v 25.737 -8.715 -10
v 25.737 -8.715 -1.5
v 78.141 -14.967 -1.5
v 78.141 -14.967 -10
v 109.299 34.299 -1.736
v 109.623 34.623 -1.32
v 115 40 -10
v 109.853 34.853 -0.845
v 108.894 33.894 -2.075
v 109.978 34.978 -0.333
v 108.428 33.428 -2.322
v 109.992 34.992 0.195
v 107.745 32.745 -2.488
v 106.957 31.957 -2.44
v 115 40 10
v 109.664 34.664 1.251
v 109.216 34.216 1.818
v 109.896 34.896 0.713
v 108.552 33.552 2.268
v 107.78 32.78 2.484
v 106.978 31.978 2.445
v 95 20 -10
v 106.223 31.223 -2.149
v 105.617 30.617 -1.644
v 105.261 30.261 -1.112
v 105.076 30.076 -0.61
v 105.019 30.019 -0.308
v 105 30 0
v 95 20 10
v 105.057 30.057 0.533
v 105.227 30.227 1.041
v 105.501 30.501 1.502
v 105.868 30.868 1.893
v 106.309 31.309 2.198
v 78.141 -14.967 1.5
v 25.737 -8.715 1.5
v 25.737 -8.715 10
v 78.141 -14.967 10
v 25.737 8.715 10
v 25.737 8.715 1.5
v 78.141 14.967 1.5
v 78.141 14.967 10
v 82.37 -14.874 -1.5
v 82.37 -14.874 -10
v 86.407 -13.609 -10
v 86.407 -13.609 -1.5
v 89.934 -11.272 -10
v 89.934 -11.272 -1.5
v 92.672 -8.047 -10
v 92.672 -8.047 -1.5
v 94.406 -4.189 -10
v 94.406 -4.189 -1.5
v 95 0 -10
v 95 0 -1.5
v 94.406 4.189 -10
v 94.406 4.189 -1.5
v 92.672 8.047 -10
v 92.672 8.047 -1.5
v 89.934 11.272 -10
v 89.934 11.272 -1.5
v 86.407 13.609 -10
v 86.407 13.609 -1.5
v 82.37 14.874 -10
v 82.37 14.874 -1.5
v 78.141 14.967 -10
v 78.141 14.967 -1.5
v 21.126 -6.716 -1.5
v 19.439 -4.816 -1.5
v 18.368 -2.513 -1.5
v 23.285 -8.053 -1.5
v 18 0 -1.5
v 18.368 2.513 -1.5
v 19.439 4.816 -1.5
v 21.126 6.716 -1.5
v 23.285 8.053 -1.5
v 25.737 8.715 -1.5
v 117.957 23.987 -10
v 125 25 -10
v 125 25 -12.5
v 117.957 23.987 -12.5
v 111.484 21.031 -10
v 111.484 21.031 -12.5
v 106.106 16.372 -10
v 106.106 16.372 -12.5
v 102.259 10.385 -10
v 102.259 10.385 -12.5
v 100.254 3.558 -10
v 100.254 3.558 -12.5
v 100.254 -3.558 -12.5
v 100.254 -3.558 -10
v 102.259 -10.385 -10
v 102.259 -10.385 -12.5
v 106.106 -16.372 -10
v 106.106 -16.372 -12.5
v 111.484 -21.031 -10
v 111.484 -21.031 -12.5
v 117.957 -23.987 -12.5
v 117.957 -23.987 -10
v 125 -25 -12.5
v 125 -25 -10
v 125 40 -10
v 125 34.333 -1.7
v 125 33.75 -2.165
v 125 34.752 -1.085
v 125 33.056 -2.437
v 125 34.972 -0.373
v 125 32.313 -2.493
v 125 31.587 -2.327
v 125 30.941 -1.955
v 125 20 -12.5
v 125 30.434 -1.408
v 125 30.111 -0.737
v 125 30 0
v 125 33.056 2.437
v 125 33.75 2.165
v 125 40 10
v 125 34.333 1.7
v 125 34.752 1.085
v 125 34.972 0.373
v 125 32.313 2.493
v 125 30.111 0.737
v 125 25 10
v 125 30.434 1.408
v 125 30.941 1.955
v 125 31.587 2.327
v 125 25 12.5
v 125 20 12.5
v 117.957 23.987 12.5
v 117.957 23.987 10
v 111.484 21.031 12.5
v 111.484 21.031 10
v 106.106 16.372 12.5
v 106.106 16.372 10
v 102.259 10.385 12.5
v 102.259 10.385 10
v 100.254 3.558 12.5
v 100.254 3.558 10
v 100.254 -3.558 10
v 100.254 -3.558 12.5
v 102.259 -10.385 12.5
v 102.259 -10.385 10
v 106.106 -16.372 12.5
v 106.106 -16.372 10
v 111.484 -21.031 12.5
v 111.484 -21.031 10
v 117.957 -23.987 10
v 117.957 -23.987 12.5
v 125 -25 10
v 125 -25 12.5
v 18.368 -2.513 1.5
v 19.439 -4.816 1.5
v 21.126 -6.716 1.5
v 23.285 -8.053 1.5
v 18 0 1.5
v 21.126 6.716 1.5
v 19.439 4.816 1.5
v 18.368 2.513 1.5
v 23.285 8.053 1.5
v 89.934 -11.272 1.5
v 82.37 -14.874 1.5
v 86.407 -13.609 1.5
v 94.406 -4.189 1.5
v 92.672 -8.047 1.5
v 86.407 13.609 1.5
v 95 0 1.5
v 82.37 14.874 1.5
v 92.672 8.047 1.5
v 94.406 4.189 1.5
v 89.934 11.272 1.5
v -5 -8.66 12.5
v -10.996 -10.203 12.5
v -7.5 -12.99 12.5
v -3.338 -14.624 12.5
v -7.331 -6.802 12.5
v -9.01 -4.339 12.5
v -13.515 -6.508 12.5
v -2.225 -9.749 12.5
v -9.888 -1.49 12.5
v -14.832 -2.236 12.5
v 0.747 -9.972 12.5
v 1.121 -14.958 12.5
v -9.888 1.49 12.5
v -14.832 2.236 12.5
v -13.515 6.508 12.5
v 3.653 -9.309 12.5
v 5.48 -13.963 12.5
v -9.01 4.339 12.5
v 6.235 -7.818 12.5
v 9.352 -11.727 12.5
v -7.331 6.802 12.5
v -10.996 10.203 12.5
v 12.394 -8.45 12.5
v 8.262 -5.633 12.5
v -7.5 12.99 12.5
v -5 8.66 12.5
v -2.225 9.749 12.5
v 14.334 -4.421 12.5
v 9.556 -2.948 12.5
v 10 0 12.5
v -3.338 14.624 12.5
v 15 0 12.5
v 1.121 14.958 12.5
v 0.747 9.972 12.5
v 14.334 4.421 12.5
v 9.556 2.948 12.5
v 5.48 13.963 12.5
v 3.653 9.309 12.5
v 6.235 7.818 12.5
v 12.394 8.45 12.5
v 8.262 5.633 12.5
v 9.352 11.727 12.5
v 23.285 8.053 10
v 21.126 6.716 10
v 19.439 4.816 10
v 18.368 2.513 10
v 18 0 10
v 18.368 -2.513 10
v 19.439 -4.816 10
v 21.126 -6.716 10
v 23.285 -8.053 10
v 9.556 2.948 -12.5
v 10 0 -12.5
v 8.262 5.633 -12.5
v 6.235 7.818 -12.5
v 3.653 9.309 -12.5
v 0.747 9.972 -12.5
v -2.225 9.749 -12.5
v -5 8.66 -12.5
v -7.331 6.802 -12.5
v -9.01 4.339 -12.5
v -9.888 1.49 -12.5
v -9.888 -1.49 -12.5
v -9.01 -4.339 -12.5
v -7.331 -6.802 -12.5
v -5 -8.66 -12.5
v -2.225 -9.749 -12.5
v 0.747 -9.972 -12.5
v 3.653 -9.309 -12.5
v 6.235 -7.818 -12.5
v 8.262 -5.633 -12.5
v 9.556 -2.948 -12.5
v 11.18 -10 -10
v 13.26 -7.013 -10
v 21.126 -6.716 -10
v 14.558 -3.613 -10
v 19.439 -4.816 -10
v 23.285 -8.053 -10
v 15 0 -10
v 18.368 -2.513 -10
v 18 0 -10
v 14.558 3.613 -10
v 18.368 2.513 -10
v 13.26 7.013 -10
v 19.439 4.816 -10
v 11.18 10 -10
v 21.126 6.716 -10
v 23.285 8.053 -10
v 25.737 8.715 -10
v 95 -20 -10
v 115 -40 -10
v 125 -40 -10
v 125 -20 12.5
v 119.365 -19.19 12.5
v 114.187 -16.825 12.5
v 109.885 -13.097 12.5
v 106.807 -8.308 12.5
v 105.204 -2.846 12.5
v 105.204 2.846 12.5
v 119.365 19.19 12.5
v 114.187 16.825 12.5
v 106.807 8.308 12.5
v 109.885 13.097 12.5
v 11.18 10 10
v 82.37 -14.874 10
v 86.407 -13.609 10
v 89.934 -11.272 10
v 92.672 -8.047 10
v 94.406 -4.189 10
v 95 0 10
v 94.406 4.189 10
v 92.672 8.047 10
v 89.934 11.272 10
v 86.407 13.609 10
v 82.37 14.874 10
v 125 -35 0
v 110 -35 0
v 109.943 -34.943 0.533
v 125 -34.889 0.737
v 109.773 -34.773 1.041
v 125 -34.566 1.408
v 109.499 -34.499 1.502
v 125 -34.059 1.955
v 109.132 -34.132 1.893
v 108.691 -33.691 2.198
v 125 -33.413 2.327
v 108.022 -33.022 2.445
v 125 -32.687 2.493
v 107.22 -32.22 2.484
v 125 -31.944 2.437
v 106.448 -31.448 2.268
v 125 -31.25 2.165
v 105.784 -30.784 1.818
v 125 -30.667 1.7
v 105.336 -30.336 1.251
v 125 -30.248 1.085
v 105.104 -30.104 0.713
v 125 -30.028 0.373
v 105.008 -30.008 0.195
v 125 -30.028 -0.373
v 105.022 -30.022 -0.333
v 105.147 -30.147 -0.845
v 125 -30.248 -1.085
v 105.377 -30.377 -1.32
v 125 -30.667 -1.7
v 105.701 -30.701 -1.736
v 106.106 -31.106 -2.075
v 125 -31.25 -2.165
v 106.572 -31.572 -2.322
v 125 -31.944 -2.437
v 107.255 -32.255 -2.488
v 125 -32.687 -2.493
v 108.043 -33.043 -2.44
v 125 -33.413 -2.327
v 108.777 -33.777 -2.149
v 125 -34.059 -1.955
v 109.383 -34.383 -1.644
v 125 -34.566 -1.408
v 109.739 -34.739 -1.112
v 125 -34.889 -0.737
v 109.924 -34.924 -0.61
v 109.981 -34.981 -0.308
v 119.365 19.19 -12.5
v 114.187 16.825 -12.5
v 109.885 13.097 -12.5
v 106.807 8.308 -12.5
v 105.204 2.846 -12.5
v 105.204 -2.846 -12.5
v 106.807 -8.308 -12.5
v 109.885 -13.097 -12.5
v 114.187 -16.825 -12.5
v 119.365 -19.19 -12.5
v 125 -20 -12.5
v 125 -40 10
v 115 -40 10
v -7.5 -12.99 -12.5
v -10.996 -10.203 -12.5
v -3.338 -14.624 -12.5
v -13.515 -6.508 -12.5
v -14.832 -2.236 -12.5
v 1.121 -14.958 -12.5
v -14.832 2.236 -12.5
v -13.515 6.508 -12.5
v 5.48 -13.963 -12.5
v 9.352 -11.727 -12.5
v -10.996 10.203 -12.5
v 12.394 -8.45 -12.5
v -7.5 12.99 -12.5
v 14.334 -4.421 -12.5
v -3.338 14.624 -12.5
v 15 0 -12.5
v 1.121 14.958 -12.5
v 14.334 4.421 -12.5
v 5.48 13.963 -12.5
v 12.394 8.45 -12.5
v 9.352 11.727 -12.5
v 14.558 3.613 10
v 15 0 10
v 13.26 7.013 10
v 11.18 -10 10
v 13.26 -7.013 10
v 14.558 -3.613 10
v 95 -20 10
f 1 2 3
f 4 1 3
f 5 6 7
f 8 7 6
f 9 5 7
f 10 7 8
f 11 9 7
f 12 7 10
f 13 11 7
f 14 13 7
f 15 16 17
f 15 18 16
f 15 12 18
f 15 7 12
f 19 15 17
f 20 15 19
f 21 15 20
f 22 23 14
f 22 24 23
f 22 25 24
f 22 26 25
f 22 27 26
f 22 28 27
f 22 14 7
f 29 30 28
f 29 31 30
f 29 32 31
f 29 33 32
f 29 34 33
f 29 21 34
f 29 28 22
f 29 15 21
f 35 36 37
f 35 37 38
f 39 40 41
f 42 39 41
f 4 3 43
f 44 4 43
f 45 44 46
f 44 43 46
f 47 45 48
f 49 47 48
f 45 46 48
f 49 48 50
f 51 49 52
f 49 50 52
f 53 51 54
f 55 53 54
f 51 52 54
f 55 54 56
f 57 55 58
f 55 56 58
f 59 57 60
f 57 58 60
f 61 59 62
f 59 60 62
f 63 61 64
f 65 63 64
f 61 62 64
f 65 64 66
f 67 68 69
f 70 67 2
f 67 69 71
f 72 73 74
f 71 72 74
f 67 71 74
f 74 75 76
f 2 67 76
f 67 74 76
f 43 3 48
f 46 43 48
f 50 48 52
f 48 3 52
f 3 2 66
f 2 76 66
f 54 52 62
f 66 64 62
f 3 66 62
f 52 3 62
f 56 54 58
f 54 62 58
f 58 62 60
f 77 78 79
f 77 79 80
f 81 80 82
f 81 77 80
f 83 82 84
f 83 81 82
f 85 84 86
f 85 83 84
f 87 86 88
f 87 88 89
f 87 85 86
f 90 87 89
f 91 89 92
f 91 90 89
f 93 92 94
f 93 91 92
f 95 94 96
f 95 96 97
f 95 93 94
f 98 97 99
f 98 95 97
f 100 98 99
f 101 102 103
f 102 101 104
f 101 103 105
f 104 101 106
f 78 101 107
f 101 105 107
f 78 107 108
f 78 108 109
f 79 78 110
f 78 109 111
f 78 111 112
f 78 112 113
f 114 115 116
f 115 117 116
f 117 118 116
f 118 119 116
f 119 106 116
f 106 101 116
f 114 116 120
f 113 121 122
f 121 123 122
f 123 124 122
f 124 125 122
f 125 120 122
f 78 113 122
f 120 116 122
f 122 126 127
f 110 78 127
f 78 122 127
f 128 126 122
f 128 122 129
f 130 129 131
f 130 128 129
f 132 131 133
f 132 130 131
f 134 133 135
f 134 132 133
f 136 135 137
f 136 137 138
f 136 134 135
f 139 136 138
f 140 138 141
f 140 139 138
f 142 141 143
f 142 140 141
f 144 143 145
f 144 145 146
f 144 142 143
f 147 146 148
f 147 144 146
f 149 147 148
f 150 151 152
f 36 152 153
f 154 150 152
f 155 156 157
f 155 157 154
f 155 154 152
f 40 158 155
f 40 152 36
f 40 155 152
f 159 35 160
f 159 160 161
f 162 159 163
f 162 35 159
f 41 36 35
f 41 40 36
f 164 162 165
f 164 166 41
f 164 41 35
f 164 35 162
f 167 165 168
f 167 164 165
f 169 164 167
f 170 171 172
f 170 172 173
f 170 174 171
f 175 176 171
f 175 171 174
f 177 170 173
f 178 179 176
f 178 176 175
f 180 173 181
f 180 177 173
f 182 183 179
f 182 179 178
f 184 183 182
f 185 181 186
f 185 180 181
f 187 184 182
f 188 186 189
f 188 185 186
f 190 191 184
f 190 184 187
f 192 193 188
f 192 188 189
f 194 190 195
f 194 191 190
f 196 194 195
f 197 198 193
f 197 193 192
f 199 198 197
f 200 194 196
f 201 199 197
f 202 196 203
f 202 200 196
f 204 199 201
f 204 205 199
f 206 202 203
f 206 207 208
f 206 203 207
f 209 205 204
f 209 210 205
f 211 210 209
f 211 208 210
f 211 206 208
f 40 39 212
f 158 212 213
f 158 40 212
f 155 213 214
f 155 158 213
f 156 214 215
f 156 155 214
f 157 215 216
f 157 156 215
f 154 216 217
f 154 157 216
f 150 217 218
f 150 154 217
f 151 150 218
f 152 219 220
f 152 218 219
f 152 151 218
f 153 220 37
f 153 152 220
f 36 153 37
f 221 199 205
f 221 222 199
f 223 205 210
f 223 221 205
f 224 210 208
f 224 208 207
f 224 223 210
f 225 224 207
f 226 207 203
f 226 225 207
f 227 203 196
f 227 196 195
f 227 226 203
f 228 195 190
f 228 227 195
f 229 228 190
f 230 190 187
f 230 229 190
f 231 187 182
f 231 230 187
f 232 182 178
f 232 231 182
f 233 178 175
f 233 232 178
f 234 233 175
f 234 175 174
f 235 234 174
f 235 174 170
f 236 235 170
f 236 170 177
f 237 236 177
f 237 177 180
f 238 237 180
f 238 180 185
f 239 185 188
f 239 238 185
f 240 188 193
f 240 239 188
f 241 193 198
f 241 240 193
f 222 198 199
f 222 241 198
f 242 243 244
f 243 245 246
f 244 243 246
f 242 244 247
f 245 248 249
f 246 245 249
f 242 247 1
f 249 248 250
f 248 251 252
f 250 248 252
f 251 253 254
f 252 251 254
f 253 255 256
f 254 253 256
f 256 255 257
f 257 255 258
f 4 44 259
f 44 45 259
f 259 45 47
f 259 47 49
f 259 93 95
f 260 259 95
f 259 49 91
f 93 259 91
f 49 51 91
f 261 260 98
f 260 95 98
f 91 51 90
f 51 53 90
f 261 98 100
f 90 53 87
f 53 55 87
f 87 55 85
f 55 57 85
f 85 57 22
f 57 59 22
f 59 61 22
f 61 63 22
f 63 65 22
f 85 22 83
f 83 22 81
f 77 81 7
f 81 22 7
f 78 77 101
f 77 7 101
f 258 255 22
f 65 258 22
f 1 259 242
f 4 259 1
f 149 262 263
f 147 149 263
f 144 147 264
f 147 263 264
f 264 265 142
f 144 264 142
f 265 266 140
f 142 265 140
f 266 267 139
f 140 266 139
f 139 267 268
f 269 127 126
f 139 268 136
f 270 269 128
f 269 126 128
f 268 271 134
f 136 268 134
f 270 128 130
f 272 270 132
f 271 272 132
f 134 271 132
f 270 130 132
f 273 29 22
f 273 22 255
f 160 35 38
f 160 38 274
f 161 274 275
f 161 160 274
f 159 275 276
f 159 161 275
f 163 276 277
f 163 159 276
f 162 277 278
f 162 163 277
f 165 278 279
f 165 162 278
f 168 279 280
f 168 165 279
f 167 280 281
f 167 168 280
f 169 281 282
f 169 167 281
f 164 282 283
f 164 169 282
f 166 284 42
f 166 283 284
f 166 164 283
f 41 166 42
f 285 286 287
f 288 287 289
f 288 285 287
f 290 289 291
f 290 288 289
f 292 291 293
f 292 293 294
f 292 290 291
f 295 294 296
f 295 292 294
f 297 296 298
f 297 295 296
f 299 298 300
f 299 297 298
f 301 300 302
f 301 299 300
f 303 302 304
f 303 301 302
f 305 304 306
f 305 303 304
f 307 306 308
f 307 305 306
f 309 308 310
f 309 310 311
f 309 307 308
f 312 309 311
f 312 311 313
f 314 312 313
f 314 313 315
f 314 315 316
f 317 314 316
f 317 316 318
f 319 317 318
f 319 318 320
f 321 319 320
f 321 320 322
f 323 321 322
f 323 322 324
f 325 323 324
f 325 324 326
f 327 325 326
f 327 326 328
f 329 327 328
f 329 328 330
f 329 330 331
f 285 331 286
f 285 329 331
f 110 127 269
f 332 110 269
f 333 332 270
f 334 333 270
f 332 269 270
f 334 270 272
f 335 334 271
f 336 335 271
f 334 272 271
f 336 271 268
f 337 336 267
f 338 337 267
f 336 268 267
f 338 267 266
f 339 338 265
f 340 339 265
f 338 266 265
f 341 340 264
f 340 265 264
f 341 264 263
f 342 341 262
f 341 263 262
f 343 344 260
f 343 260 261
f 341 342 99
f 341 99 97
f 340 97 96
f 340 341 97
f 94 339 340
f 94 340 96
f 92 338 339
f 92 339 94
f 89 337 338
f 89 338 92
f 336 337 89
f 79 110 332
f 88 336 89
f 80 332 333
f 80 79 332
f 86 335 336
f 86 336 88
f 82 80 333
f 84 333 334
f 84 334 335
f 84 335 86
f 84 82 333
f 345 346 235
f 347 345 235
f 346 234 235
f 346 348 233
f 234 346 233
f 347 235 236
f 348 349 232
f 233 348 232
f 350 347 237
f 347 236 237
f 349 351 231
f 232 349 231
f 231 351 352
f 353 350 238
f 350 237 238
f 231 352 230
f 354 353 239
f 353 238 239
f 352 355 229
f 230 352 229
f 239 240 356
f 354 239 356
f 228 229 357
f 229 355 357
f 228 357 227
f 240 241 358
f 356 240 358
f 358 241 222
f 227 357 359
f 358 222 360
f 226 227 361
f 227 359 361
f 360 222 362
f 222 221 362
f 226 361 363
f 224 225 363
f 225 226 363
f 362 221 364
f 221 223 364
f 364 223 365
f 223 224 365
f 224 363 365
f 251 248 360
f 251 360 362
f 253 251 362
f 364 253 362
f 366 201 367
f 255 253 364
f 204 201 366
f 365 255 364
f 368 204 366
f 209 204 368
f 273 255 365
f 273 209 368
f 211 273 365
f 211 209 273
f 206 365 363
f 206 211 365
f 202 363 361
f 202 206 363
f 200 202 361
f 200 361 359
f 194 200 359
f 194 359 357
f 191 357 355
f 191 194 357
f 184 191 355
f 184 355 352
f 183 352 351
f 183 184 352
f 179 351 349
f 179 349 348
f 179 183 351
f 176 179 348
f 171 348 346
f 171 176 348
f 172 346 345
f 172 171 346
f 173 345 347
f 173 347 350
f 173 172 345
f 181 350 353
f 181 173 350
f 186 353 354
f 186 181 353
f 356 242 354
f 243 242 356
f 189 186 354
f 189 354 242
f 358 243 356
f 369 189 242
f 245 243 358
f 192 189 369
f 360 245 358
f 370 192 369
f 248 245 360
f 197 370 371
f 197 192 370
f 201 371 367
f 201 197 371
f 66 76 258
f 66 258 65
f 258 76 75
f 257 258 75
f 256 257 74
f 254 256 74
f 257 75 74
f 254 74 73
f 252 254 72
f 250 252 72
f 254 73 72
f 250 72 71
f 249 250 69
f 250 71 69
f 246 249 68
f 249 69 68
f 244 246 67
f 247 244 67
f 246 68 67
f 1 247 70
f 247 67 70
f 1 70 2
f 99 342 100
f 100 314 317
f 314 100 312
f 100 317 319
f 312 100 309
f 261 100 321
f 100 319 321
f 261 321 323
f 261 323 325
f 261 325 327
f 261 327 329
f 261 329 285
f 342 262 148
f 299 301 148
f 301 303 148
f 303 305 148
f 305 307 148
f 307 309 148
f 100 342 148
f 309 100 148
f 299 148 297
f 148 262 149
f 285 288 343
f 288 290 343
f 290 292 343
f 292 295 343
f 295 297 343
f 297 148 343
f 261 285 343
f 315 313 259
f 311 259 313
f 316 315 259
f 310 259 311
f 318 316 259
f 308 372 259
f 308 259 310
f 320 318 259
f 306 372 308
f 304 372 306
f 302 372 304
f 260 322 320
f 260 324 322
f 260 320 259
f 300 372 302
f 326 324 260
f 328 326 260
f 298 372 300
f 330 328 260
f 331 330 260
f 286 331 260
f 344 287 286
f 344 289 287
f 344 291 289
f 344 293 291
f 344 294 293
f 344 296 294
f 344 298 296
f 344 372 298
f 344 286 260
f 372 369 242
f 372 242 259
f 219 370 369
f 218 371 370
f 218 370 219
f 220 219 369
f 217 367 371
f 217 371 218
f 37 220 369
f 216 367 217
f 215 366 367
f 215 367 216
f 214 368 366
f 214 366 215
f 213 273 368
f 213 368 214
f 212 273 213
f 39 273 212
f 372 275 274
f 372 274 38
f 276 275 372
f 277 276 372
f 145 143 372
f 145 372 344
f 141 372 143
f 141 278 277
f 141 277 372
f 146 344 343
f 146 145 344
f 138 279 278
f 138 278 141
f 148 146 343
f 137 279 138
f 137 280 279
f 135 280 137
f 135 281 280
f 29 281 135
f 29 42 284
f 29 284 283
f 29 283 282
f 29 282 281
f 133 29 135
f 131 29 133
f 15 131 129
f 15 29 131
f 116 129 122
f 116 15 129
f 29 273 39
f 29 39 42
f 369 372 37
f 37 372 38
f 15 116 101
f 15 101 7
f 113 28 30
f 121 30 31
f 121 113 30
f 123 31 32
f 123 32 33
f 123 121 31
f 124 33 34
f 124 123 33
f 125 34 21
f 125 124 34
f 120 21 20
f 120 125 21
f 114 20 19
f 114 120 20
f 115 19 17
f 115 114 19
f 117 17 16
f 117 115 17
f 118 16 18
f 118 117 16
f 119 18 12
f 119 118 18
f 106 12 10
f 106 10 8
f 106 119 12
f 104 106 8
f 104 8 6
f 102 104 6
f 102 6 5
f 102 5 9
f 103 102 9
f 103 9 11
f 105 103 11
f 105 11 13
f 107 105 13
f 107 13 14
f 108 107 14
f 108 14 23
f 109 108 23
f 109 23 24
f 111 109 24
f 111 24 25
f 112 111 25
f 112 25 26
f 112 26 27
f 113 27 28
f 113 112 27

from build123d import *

# Parameters (mm, degrees)
SKETCH001_R     = 15
SKETCH001_R_2   = 10
PAD_DEPTH       = 12.5
PAD001_DEPTH    = 10
PAD002_DEPTH    = 12.5
POCKET_DEPTH    = 337.344377
SKETCH006_R     = 2.5
POCKET001_DEPTH = 140.001


with BuildPart() as part:
    # Sketch001 → Pad (new body, symmetric)
    with BuildSketch(Plane.XY):
        Circle(SKETCH001_R)
        Circle(SKETCH001_R_2, mode=Mode.SUBTRACT)
    extrude(amount=PAD_DEPTH, both=True)

    # Sketch004 → Pad001 (join, symmetric)
    with BuildSketch(Plane.XY):
        with BuildLine():
            Line((125, 25), (125, 40))
            Line((125, 40), (115, 40))
            Line((115, 40), (95, 20))
            Line((95, 20), (11.18034, 10))
            ThreePointArc((11.18034, -10), (15, 0), (11.18034, 10))
            Line((11.18034, -10), (95, -20))
            Line((95, -20), (115, -40))
            Line((115, -40), (125, -40))
            Line((125, -40), (125, -25))
            ThreePointArc((125, 25), (100, 0), (125, -25))
        make_face()
    extrude(amount=PAD001_DEPTH, both=True)

    # Sketch003 → Pad002 (join, symmetric)
    with BuildSketch(Plane.XY):
        with BuildLine():
            ThreePointArc((125, 20), (105, 0), (125, -20))
            Line((125, -20), (125, -25))
            ThreePointArc((125, 25), (100, 0), (125, -25))
            Line((125, 25), (125, 20))
        make_face()
    extrude(amount=PAD002_DEPTH, both=True)

    # Sketch005 (on DatumPlane) → Pocket (cut, through all)
    with BuildSketch(Plane.XY.offset(1.5)):
        with BuildLine():
            ThreePointArc((25.737466, 8.715445), (18, 0), (25.737466, -8.715445))
            Line((25.737466, -8.715445), (78.140832, -14.967363))
            ThreePointArc((78.140832, -14.967363), (95, 0), (78.140832, 14.967363))
            Line((25.737466, 8.715445), (78.140832, 14.967363))
        make_face()
    pocket = extrude(amount=POCKET_DEPTH, mode=Mode.SUBTRACT)

    # Mirrored: Pocket across XY
    add(pocket.mirror(Plane.XY), mode=Mode.SUBTRACT)

    # Sketch006 (on DatumPlane) → Pocket001 (cut, through all)
    with BuildSketch(Plane(origin=(125, 0, 0), x_dir=(0, -1, 0), z_dir=(-1, 0, 0))):
        with Locations((-32.5, 0)):
            Circle(SKETCH006_R)
        with Locations((32.5, 0)):
            Circle(SKETCH006_R)
    extrude(amount=POCKET001_DEPTH, mode=Mode.SUBTRACT)


solid = part.part
